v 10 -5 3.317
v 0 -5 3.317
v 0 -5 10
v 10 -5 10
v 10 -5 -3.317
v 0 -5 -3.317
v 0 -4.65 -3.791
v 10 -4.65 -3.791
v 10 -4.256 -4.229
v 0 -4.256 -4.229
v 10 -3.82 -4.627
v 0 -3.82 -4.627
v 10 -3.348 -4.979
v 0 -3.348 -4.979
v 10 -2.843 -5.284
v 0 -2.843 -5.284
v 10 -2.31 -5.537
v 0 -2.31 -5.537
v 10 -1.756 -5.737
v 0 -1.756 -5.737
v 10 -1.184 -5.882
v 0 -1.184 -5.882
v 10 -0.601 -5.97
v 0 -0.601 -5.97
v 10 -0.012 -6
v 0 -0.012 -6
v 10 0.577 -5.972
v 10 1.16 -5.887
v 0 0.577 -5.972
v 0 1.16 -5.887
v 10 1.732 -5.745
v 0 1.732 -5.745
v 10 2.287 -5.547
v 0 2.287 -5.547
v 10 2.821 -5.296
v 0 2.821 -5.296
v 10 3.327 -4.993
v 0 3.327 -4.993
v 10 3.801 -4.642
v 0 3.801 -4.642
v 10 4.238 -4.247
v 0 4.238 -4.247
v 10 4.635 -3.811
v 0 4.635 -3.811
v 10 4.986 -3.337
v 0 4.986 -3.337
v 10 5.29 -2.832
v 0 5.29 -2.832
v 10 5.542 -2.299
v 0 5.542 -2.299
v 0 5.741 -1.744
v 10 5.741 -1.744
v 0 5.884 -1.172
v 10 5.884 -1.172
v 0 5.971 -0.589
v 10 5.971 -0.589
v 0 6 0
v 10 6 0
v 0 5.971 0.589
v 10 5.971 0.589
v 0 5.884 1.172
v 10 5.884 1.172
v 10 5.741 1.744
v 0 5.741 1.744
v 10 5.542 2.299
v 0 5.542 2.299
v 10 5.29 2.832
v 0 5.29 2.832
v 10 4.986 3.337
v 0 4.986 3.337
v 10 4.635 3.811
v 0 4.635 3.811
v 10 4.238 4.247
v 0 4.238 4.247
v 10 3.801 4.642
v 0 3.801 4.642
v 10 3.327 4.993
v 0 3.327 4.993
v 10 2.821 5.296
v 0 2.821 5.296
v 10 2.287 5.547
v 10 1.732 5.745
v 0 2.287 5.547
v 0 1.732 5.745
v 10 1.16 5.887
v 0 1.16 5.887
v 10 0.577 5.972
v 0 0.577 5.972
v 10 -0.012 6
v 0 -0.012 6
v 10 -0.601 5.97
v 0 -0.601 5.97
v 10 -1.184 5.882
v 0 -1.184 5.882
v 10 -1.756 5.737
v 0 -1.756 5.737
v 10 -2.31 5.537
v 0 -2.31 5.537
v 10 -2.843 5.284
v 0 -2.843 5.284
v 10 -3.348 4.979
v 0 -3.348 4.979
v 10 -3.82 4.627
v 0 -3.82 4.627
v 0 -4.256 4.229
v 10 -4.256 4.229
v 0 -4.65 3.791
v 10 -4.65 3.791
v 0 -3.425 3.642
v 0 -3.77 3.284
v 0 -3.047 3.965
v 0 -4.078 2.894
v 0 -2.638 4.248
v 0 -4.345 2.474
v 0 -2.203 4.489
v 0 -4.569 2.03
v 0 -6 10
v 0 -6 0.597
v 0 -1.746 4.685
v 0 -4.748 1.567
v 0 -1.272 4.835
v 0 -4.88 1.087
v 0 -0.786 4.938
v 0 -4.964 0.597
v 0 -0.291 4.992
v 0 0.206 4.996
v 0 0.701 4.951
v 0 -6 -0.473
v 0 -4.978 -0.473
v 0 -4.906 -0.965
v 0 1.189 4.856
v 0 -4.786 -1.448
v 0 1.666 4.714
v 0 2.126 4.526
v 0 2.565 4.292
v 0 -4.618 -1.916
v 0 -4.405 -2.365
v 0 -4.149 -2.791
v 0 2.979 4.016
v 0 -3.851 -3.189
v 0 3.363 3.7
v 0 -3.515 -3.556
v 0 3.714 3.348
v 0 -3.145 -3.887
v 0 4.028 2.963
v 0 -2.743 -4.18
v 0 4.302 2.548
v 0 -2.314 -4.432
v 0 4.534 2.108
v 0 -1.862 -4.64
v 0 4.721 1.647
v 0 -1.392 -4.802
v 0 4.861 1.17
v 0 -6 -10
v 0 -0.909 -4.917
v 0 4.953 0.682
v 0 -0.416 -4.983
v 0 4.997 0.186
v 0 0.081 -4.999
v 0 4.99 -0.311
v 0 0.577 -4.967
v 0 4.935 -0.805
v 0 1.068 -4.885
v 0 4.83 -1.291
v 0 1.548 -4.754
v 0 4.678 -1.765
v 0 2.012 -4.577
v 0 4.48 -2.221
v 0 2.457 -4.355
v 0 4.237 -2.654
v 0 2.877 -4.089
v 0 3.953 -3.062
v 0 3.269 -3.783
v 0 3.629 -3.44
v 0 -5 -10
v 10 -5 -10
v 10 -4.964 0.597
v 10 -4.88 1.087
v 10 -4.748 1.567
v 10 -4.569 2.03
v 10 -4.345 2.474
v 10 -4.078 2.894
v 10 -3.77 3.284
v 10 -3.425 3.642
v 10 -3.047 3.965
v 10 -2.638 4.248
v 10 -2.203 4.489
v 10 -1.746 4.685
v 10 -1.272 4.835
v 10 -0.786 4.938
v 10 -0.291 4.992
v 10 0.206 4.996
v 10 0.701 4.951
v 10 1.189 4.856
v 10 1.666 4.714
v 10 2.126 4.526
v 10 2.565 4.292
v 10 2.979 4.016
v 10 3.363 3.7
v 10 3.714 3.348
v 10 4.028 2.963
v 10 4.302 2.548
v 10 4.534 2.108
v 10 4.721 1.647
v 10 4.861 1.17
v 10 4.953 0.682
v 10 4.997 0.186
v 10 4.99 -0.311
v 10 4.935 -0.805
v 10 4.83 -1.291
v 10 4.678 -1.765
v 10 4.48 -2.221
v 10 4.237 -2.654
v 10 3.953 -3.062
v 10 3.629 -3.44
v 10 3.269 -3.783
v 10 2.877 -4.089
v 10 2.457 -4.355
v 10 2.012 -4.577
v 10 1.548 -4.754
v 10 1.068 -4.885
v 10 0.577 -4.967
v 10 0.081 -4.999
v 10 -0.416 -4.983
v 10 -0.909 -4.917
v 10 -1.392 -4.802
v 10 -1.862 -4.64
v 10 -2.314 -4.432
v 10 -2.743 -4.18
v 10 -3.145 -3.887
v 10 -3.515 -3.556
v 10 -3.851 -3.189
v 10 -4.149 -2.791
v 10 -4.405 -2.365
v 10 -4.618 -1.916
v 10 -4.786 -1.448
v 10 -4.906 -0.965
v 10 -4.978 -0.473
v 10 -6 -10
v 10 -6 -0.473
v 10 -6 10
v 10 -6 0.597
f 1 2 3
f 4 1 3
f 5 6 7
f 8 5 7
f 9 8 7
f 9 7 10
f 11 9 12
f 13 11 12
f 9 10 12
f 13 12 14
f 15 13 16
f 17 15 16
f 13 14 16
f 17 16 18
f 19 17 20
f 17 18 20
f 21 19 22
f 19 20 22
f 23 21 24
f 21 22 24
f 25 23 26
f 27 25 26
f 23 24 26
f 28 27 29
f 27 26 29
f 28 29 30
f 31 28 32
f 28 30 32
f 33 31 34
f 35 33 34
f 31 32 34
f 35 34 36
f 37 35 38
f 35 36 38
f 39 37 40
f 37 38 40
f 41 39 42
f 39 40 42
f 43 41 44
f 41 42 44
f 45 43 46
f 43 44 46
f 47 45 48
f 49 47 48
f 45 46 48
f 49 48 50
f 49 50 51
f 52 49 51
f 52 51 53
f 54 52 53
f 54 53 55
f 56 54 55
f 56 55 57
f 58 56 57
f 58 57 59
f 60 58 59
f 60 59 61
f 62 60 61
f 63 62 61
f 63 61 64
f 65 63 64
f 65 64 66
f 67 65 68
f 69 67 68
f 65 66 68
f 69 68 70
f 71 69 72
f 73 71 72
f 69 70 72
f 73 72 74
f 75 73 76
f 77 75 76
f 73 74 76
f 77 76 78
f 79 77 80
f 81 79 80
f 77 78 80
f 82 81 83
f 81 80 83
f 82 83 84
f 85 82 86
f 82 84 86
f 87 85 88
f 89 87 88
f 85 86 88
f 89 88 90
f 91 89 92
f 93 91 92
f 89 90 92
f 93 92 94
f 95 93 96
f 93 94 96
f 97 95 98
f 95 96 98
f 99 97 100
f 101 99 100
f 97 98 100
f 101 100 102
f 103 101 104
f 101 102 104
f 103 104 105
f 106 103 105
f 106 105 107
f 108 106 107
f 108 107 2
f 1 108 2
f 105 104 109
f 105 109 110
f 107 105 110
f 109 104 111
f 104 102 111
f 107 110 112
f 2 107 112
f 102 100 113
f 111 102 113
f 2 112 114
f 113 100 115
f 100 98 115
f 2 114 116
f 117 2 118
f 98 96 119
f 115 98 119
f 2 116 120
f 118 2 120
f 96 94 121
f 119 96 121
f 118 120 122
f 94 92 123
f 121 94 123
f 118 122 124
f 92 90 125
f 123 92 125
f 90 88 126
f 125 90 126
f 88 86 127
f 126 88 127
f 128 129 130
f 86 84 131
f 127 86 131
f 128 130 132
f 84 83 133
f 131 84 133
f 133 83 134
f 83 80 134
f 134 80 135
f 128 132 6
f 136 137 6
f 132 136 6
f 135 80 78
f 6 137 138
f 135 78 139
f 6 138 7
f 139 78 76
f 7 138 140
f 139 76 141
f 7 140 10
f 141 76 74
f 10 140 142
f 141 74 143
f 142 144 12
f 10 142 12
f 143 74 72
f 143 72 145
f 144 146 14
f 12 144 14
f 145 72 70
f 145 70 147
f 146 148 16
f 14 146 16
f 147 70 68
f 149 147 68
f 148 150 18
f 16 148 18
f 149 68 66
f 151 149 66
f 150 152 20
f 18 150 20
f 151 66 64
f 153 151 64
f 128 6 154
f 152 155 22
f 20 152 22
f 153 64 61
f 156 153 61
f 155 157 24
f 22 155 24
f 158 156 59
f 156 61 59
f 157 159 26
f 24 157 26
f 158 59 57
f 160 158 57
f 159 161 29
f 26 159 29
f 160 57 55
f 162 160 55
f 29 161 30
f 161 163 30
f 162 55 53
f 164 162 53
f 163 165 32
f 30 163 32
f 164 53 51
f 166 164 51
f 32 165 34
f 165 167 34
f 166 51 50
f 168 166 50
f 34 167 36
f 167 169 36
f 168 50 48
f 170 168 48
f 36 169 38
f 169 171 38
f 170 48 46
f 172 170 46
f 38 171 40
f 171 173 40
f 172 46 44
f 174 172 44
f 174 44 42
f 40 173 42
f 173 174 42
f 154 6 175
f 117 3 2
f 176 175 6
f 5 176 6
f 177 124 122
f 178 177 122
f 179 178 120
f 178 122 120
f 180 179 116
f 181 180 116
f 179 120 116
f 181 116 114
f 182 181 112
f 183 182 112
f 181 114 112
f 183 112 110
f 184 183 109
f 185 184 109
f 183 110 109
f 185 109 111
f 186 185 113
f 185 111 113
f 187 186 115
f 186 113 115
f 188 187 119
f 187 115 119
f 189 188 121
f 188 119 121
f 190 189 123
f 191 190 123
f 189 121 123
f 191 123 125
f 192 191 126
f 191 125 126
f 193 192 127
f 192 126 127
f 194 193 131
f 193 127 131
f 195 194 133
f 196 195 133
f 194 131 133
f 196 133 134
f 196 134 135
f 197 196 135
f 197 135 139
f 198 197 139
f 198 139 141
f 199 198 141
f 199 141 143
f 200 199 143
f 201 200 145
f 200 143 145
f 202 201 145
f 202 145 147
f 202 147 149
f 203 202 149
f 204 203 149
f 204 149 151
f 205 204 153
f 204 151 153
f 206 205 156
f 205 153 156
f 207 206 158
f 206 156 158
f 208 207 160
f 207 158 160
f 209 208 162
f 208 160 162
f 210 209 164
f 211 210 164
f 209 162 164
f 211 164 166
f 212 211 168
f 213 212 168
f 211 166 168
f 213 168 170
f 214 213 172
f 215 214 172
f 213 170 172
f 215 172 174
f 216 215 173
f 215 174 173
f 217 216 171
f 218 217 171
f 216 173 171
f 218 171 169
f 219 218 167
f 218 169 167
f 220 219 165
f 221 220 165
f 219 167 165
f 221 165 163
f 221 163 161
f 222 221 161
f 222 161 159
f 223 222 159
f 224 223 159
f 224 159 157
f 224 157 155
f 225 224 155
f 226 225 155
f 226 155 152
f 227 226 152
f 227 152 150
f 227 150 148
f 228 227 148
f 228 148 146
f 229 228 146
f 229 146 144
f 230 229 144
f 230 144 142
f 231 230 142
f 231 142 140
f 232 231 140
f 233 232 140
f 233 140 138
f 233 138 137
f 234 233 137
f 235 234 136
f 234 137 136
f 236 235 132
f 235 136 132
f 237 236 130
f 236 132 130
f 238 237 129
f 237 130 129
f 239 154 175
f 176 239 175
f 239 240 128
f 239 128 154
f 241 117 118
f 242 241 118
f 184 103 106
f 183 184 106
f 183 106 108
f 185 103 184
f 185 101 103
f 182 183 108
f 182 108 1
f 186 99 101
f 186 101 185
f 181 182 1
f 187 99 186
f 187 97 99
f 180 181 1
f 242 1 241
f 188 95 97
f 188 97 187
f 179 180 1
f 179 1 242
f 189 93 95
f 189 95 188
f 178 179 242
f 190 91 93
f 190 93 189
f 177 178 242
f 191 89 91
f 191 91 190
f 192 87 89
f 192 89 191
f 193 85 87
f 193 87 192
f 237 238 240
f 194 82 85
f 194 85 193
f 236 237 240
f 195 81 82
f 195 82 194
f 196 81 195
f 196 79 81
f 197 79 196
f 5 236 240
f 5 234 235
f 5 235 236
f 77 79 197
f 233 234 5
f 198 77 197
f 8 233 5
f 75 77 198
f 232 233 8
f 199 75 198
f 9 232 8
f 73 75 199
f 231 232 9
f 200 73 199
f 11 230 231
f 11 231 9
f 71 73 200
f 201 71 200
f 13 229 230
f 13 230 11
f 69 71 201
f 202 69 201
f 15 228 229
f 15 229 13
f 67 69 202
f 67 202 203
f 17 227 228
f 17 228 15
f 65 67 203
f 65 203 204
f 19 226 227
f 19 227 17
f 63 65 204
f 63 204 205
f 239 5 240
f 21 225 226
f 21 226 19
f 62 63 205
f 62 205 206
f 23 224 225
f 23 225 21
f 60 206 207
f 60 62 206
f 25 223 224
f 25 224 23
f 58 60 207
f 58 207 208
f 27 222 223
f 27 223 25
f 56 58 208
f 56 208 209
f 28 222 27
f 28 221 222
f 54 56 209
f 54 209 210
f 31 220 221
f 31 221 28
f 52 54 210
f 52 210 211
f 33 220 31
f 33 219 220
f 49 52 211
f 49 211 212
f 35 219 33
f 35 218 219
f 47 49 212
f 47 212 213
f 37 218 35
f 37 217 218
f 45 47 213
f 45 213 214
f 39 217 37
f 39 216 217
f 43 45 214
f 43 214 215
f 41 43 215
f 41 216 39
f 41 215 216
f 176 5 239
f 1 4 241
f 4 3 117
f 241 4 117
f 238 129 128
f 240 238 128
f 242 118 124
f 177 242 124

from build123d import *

# Parameters (mm, degrees)
BOSS_EXTRUDE1_DEPTH = 10


with BuildPart() as part:
    # Sketch1 → Boss-Extrude1 (new body)
    with BuildSketch(Plane(origin=(0, 0, 0), x_dir=(0, 0, -1), z_dir=(1, 0, 0))):
        with BuildLine():
            Line((10, -5), (3.31662479, -5))
            ThreePointArc((3.31662479, -5), (0, 6), (-3.31662479, -5))
            Line((-3.31662479, -5), (-10, -5))
            Line((-10, -5), (-10, -6))
            Line((-10, -6), (-0.597061761, -6))
            Line((-0.597061761, -6), (-0.597061761, -4.964223731))
            ThreePointArc((-0.597061761, -4.964223731), (0.062391283, 4.999610718), (0.472995759, -4.977577223))
            Line((0.472995759, -4.977577223), (0.472995759, -6))
            Line((0.472995759, -6), (10, -6))
            Line((10, -6), (10, -5))
        make_face()
    extrude(amount=BOSS_EXTRUDE1_DEPTH)


solid = part.part
